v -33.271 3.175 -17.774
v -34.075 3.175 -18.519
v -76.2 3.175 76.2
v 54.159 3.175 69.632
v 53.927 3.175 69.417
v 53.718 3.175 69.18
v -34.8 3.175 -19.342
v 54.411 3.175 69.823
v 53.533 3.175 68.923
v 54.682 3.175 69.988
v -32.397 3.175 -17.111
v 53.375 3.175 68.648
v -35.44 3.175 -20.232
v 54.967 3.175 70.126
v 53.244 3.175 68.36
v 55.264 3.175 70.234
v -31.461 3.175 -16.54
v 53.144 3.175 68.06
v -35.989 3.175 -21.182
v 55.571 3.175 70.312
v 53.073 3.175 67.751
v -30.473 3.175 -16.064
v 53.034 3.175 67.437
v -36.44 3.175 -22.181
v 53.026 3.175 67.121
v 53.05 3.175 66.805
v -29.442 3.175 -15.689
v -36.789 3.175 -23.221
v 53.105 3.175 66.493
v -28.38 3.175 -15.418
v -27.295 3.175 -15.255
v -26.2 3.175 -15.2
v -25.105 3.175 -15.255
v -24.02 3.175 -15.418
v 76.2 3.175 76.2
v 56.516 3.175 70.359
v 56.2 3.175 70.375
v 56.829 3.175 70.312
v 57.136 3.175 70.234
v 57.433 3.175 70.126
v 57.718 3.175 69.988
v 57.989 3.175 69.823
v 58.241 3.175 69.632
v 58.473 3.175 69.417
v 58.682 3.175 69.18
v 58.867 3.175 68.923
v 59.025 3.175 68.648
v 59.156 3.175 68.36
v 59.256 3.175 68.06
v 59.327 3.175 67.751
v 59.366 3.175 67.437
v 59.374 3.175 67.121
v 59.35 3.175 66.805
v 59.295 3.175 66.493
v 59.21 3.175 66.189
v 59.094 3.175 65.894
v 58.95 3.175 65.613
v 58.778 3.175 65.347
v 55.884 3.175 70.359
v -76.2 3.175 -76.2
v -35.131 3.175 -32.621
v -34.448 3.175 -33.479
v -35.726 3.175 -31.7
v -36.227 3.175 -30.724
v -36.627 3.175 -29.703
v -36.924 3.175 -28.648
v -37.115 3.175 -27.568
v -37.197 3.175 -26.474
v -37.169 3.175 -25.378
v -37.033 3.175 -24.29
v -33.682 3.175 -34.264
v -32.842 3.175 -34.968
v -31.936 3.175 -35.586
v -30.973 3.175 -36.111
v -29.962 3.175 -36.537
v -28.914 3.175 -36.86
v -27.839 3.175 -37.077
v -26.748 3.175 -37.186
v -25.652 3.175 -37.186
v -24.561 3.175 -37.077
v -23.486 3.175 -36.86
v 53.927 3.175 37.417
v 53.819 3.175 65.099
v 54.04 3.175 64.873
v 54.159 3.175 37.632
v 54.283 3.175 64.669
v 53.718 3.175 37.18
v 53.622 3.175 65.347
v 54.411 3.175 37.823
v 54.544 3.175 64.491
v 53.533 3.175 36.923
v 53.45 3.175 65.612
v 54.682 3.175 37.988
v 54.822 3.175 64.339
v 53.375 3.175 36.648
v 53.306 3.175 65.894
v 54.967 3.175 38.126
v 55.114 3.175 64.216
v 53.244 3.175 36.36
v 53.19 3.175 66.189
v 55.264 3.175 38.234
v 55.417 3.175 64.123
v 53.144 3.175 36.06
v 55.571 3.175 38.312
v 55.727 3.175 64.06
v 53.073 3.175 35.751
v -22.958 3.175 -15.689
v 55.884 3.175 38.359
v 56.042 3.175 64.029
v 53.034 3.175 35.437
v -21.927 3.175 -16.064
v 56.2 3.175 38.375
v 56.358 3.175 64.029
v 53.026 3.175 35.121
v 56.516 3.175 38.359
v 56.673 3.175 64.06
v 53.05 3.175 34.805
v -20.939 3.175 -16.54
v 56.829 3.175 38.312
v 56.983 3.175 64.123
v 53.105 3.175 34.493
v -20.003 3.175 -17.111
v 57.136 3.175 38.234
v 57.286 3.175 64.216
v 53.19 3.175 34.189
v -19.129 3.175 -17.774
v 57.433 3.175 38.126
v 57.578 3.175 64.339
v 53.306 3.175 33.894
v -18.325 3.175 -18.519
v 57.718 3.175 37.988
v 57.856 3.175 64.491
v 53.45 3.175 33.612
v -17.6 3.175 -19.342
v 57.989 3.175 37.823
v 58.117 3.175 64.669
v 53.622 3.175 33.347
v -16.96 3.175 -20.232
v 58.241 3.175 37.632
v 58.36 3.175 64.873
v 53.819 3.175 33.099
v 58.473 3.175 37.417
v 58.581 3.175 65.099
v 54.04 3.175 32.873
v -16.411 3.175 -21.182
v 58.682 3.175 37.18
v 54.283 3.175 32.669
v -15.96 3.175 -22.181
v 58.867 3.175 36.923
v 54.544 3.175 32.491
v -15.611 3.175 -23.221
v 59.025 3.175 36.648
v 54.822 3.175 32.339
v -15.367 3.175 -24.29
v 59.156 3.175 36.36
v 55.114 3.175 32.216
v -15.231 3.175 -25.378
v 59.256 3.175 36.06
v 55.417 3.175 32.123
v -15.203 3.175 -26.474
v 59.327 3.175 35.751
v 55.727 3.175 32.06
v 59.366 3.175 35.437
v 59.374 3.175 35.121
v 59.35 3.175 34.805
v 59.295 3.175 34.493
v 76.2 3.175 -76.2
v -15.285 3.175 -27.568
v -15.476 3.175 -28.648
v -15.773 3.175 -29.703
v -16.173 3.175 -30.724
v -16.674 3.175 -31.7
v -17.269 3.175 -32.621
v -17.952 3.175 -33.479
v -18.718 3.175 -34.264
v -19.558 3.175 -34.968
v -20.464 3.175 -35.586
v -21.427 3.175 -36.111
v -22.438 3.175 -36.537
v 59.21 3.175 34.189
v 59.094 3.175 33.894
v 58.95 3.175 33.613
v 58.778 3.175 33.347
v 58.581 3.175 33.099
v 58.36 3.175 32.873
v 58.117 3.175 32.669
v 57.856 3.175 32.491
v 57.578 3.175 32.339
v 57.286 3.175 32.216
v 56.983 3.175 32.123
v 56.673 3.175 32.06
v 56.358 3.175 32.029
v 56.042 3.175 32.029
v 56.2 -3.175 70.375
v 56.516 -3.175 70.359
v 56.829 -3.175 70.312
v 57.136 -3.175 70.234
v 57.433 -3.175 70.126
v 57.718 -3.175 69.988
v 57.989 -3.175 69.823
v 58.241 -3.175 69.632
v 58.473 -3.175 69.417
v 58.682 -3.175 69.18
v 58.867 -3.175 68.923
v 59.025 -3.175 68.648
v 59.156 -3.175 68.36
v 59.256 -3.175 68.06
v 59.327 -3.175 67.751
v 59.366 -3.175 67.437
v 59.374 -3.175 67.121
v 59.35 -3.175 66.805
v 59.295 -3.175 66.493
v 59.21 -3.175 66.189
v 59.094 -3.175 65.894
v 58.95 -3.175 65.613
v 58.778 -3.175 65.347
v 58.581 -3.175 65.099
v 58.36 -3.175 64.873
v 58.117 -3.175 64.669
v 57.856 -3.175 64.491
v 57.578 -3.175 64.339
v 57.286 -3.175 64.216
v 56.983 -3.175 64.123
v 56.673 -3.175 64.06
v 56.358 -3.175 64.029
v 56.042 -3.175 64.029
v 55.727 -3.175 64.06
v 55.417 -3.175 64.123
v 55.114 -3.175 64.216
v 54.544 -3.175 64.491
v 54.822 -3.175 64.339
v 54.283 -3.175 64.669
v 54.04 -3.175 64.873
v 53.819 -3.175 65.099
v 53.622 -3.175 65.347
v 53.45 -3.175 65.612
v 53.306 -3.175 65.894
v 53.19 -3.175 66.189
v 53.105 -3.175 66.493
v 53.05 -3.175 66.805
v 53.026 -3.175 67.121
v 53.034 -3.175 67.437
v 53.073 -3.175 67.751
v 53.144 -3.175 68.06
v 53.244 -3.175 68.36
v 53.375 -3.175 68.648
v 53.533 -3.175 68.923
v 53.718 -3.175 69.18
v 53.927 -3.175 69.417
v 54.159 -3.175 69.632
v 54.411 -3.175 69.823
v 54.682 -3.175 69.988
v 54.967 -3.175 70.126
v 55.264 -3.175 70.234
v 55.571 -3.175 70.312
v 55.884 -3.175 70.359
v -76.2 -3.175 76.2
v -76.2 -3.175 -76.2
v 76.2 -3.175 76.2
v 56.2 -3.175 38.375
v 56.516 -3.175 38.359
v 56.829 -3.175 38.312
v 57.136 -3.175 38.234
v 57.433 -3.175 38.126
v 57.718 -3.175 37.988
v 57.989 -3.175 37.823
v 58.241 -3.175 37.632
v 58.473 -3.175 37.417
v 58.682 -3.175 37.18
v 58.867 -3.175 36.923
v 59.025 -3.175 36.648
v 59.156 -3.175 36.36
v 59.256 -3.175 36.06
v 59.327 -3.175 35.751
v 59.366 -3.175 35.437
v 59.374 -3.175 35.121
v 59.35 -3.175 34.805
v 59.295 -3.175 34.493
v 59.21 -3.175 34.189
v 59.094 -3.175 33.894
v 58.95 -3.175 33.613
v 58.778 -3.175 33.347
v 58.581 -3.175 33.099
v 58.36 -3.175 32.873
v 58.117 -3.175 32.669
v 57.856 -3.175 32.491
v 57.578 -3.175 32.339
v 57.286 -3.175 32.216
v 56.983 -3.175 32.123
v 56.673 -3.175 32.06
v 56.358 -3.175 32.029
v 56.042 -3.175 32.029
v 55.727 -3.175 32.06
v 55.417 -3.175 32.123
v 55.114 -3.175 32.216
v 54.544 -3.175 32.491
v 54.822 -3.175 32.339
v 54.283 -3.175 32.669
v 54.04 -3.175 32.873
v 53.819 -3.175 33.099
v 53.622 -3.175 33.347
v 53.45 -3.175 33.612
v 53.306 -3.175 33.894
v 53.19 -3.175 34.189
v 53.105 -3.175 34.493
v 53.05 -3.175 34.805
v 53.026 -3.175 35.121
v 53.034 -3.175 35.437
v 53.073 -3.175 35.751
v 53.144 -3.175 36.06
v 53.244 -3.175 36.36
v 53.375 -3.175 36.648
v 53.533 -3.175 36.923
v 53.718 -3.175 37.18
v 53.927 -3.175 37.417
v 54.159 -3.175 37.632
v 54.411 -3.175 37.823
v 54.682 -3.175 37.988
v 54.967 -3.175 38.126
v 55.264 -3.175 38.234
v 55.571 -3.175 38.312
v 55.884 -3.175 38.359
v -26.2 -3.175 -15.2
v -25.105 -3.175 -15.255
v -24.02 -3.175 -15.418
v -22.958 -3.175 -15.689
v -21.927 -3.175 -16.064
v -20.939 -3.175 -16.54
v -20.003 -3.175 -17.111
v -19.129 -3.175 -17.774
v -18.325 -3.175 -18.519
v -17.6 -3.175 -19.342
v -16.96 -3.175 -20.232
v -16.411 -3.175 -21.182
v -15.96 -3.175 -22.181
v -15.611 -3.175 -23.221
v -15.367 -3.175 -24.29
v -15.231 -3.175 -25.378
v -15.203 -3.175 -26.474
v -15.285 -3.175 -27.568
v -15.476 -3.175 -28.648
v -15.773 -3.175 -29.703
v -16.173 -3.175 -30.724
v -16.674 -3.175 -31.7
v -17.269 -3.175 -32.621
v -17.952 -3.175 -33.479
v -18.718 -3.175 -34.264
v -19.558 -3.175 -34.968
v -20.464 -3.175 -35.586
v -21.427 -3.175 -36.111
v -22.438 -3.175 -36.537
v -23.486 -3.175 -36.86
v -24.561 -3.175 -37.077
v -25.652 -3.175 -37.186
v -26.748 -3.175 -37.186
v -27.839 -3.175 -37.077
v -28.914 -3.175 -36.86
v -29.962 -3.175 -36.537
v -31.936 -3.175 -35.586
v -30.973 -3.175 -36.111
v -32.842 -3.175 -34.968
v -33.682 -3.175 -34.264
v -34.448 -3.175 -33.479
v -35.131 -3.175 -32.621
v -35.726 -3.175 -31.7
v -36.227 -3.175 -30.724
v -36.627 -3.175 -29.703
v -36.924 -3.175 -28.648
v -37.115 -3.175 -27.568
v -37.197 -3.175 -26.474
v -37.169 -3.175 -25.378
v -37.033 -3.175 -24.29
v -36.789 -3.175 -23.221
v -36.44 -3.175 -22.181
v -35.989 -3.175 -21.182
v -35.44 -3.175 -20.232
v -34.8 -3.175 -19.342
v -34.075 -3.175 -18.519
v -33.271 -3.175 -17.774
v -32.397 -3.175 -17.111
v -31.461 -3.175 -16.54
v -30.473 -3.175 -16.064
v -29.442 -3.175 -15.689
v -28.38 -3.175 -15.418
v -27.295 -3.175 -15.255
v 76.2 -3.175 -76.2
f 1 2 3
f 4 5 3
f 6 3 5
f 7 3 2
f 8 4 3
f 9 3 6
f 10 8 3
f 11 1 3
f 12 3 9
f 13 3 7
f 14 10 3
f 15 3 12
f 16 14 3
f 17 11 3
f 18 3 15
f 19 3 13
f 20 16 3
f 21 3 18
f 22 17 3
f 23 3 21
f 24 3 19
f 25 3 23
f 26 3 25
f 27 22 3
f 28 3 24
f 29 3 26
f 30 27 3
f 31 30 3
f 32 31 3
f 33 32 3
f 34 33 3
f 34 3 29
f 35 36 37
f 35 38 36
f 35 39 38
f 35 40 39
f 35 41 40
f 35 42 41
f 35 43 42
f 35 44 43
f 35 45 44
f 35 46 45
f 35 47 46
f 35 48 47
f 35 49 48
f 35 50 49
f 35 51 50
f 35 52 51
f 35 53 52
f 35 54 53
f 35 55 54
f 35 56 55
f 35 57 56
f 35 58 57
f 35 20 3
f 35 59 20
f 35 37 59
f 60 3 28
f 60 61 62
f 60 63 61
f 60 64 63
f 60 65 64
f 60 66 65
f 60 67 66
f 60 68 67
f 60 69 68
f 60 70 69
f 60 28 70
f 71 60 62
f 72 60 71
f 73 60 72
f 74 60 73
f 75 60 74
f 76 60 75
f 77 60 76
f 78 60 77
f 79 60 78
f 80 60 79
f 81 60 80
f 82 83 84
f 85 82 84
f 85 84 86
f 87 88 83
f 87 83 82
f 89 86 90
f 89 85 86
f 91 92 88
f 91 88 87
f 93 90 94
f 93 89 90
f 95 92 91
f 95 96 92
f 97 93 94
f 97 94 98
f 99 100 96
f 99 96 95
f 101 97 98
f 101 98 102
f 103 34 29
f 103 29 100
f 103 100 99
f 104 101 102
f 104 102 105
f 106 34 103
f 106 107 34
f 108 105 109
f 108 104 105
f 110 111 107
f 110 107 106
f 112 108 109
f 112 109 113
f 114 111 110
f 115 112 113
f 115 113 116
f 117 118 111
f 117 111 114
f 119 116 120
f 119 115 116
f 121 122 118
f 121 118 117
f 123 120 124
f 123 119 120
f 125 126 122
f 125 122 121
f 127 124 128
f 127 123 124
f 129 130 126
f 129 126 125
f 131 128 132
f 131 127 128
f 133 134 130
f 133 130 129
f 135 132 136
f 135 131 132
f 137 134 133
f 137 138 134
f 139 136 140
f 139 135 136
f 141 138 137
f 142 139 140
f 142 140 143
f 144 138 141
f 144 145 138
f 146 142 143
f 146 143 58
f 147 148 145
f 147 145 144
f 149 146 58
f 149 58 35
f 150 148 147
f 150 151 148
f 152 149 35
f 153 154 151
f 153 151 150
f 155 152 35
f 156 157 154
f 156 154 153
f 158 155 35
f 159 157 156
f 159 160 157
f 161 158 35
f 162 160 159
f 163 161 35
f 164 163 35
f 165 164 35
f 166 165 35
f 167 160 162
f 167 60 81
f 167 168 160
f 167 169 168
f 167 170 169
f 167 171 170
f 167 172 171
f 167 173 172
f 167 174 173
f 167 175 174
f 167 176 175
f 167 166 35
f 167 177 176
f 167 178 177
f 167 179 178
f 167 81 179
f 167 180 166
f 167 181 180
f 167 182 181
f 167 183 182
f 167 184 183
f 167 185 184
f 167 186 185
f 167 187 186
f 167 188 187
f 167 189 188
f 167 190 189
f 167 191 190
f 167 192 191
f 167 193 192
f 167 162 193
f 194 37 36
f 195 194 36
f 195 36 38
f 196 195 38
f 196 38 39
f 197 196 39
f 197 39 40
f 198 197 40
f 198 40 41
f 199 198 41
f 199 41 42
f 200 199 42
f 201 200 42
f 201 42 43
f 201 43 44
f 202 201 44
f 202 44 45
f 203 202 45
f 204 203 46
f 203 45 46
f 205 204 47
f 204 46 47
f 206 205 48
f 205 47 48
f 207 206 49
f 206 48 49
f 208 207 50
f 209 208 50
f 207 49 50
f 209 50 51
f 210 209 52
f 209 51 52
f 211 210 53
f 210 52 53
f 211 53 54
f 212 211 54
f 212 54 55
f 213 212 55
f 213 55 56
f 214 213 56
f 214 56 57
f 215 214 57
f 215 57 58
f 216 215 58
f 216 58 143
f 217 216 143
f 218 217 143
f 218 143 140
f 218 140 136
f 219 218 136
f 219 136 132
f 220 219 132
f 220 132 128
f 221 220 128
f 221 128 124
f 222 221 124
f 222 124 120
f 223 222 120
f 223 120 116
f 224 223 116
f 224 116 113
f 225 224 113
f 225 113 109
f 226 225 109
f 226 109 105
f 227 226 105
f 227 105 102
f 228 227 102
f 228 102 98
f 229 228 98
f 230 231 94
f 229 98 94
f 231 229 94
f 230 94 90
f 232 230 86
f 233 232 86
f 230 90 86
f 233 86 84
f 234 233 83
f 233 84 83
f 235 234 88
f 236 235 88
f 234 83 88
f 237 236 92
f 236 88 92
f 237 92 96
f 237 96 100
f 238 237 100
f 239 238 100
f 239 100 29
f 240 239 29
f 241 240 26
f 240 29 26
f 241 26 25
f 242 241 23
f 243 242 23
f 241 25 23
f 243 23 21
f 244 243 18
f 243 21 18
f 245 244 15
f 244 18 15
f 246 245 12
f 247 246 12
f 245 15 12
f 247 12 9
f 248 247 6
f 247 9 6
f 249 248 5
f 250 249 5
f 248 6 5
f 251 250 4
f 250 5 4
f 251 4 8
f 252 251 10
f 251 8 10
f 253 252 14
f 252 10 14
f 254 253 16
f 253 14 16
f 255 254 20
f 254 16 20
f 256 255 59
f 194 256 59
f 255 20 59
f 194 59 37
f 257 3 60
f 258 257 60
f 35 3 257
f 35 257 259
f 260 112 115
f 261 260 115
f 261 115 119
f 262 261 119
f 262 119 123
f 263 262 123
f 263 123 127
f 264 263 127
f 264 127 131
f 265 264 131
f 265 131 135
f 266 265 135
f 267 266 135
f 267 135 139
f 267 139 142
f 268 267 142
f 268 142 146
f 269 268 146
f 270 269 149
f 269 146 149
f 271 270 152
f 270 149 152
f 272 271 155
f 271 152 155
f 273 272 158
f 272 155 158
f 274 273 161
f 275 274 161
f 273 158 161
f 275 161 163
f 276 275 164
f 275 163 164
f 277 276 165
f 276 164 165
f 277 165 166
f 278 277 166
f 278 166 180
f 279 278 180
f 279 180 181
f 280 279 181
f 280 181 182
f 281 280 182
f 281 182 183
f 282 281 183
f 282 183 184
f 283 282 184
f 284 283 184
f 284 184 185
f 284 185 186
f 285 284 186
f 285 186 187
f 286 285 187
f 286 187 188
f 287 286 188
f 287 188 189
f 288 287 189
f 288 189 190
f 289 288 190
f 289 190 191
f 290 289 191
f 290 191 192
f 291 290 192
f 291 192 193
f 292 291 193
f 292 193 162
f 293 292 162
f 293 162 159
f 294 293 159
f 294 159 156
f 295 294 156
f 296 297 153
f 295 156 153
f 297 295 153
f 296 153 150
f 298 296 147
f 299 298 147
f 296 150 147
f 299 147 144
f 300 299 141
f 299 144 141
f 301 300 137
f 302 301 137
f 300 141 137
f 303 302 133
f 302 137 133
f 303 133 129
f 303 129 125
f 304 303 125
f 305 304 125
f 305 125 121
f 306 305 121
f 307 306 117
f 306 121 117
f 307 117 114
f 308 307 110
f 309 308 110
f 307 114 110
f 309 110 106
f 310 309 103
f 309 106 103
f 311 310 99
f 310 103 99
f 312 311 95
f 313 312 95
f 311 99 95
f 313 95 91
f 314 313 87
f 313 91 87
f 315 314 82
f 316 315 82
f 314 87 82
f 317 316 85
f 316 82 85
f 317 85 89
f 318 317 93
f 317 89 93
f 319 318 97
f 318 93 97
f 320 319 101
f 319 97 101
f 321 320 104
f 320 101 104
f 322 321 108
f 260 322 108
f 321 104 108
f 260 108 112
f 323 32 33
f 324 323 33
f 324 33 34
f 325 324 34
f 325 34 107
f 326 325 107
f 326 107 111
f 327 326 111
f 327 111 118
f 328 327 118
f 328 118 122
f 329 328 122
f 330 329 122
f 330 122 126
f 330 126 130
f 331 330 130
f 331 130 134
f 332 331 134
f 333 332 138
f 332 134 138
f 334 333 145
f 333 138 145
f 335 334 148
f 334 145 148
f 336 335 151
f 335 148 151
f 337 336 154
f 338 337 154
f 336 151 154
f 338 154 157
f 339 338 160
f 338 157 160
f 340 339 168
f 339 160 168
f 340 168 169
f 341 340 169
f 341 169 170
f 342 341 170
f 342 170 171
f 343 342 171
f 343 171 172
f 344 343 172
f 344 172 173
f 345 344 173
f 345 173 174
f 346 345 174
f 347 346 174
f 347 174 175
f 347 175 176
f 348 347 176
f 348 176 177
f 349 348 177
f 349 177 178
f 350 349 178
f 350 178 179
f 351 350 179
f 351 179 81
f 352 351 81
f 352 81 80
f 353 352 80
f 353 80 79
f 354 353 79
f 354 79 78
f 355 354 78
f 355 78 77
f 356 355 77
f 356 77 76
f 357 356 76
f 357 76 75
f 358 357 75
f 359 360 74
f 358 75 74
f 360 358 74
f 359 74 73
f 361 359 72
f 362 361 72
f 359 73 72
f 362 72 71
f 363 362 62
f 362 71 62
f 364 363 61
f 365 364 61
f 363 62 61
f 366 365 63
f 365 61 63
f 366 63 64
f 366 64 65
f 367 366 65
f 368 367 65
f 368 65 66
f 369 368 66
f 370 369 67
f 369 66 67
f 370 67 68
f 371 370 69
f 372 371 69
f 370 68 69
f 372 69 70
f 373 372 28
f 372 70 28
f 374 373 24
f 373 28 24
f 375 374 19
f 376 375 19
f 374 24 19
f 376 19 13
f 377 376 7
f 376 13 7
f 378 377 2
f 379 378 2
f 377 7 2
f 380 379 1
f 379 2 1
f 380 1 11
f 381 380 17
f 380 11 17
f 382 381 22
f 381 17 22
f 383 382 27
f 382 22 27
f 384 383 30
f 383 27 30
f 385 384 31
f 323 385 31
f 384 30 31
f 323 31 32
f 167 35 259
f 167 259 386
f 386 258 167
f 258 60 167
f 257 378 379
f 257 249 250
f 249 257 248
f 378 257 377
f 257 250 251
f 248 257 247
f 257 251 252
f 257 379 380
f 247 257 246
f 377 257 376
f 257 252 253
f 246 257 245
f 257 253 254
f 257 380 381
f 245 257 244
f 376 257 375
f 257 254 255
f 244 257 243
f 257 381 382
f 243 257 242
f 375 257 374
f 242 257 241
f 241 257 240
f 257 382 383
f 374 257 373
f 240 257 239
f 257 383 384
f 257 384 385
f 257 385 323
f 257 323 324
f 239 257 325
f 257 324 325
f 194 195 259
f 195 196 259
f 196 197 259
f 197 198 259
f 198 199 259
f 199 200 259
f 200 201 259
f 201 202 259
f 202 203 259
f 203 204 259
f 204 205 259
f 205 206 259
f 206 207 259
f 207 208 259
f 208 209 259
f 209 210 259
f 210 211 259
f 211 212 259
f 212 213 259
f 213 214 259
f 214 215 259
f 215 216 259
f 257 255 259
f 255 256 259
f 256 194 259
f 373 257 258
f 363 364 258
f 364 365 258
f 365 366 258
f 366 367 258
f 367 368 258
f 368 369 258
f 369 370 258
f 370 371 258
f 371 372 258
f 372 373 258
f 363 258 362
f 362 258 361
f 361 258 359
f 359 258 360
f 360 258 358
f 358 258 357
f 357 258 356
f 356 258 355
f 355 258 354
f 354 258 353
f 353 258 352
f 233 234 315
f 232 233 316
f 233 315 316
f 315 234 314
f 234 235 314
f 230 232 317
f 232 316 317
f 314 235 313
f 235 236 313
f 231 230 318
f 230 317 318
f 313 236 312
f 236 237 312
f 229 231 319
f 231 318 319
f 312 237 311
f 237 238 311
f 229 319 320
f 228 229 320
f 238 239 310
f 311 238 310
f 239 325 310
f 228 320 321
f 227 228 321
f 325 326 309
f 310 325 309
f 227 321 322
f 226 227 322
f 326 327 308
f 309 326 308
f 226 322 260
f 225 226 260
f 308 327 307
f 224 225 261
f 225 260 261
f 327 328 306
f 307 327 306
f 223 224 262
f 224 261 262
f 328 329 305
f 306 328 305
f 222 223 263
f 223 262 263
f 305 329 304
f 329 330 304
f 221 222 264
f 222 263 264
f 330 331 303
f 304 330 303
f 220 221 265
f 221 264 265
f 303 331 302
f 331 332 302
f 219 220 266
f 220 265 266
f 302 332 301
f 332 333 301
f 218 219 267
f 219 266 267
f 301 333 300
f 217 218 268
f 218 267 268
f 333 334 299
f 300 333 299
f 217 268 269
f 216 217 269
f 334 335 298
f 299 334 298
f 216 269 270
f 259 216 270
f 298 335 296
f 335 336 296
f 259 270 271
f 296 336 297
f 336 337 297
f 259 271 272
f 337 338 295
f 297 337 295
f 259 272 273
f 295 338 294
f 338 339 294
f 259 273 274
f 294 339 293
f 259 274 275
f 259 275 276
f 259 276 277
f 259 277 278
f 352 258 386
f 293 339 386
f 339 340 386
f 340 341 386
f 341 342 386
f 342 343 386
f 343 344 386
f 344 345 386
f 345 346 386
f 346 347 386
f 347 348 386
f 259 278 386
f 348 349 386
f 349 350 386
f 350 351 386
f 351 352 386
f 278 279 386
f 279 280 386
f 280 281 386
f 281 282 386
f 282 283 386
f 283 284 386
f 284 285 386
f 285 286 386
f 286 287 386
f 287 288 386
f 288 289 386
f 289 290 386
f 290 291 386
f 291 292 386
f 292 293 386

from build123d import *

# Parameters (mm, degrees)
SKETCH3_W           = 152.4
SKETCH3_H           = 152.4
BOSS_EXTRUDE1_DEPTH = 3.175
SKETCH4_R           = 11
CUT_EXTRUDE1_DEPTH  = 10
SKETCH5_R           = 3.175
CUT_EXTRUDE5_DEPTH  = 10


with BuildPart() as part:
    # Sketch3 → Boss-Extrude1 (new, symmetric)
    with BuildSketch(Plane(origin=(0, 0, 0), x_dir=(1, 0, 0), z_dir=(0, 1, 0))):
        Rectangle(SKETCH3_W, SKETCH3_H)
    extrude(amount=BOSS_EXTRUDE1_DEPTH, both=True)

    # Sketch4 → Cut-Extrude1 (cut)
    with BuildSketch(Plane(origin=(0, 3.175, 0), x_dir=(1, 0, 0), z_dir=(0, 1, 0))):
        with Locations(Location((-26.2, 26.2, 0), (0, 0, 270))):
            Circle(SKETCH4_R)
    extrude(amount=-CUT_EXTRUDE1_DEPTH, mode=Mode.SUBTRACT)

    # Sketch5 → Cut-Extrude5 (cut)
    with BuildSketch(Plane(origin=(0, 3.175, 0), x_dir=(1, 0, 0), z_dir=(0, 1, 0))):
        with Locations(Location((56.2, -35.2, 0), (0, 0, 270))):
            Circle(SKETCH5_R)
        with Locations(Location((56.2, -67.2, 0), (0, 0, 270))):
            Circle(SKETCH5_R)
    extrude(amount=-CUT_EXTRUDE5_DEPTH, mode=Mode.SUBTRACT)


solid = part.part
